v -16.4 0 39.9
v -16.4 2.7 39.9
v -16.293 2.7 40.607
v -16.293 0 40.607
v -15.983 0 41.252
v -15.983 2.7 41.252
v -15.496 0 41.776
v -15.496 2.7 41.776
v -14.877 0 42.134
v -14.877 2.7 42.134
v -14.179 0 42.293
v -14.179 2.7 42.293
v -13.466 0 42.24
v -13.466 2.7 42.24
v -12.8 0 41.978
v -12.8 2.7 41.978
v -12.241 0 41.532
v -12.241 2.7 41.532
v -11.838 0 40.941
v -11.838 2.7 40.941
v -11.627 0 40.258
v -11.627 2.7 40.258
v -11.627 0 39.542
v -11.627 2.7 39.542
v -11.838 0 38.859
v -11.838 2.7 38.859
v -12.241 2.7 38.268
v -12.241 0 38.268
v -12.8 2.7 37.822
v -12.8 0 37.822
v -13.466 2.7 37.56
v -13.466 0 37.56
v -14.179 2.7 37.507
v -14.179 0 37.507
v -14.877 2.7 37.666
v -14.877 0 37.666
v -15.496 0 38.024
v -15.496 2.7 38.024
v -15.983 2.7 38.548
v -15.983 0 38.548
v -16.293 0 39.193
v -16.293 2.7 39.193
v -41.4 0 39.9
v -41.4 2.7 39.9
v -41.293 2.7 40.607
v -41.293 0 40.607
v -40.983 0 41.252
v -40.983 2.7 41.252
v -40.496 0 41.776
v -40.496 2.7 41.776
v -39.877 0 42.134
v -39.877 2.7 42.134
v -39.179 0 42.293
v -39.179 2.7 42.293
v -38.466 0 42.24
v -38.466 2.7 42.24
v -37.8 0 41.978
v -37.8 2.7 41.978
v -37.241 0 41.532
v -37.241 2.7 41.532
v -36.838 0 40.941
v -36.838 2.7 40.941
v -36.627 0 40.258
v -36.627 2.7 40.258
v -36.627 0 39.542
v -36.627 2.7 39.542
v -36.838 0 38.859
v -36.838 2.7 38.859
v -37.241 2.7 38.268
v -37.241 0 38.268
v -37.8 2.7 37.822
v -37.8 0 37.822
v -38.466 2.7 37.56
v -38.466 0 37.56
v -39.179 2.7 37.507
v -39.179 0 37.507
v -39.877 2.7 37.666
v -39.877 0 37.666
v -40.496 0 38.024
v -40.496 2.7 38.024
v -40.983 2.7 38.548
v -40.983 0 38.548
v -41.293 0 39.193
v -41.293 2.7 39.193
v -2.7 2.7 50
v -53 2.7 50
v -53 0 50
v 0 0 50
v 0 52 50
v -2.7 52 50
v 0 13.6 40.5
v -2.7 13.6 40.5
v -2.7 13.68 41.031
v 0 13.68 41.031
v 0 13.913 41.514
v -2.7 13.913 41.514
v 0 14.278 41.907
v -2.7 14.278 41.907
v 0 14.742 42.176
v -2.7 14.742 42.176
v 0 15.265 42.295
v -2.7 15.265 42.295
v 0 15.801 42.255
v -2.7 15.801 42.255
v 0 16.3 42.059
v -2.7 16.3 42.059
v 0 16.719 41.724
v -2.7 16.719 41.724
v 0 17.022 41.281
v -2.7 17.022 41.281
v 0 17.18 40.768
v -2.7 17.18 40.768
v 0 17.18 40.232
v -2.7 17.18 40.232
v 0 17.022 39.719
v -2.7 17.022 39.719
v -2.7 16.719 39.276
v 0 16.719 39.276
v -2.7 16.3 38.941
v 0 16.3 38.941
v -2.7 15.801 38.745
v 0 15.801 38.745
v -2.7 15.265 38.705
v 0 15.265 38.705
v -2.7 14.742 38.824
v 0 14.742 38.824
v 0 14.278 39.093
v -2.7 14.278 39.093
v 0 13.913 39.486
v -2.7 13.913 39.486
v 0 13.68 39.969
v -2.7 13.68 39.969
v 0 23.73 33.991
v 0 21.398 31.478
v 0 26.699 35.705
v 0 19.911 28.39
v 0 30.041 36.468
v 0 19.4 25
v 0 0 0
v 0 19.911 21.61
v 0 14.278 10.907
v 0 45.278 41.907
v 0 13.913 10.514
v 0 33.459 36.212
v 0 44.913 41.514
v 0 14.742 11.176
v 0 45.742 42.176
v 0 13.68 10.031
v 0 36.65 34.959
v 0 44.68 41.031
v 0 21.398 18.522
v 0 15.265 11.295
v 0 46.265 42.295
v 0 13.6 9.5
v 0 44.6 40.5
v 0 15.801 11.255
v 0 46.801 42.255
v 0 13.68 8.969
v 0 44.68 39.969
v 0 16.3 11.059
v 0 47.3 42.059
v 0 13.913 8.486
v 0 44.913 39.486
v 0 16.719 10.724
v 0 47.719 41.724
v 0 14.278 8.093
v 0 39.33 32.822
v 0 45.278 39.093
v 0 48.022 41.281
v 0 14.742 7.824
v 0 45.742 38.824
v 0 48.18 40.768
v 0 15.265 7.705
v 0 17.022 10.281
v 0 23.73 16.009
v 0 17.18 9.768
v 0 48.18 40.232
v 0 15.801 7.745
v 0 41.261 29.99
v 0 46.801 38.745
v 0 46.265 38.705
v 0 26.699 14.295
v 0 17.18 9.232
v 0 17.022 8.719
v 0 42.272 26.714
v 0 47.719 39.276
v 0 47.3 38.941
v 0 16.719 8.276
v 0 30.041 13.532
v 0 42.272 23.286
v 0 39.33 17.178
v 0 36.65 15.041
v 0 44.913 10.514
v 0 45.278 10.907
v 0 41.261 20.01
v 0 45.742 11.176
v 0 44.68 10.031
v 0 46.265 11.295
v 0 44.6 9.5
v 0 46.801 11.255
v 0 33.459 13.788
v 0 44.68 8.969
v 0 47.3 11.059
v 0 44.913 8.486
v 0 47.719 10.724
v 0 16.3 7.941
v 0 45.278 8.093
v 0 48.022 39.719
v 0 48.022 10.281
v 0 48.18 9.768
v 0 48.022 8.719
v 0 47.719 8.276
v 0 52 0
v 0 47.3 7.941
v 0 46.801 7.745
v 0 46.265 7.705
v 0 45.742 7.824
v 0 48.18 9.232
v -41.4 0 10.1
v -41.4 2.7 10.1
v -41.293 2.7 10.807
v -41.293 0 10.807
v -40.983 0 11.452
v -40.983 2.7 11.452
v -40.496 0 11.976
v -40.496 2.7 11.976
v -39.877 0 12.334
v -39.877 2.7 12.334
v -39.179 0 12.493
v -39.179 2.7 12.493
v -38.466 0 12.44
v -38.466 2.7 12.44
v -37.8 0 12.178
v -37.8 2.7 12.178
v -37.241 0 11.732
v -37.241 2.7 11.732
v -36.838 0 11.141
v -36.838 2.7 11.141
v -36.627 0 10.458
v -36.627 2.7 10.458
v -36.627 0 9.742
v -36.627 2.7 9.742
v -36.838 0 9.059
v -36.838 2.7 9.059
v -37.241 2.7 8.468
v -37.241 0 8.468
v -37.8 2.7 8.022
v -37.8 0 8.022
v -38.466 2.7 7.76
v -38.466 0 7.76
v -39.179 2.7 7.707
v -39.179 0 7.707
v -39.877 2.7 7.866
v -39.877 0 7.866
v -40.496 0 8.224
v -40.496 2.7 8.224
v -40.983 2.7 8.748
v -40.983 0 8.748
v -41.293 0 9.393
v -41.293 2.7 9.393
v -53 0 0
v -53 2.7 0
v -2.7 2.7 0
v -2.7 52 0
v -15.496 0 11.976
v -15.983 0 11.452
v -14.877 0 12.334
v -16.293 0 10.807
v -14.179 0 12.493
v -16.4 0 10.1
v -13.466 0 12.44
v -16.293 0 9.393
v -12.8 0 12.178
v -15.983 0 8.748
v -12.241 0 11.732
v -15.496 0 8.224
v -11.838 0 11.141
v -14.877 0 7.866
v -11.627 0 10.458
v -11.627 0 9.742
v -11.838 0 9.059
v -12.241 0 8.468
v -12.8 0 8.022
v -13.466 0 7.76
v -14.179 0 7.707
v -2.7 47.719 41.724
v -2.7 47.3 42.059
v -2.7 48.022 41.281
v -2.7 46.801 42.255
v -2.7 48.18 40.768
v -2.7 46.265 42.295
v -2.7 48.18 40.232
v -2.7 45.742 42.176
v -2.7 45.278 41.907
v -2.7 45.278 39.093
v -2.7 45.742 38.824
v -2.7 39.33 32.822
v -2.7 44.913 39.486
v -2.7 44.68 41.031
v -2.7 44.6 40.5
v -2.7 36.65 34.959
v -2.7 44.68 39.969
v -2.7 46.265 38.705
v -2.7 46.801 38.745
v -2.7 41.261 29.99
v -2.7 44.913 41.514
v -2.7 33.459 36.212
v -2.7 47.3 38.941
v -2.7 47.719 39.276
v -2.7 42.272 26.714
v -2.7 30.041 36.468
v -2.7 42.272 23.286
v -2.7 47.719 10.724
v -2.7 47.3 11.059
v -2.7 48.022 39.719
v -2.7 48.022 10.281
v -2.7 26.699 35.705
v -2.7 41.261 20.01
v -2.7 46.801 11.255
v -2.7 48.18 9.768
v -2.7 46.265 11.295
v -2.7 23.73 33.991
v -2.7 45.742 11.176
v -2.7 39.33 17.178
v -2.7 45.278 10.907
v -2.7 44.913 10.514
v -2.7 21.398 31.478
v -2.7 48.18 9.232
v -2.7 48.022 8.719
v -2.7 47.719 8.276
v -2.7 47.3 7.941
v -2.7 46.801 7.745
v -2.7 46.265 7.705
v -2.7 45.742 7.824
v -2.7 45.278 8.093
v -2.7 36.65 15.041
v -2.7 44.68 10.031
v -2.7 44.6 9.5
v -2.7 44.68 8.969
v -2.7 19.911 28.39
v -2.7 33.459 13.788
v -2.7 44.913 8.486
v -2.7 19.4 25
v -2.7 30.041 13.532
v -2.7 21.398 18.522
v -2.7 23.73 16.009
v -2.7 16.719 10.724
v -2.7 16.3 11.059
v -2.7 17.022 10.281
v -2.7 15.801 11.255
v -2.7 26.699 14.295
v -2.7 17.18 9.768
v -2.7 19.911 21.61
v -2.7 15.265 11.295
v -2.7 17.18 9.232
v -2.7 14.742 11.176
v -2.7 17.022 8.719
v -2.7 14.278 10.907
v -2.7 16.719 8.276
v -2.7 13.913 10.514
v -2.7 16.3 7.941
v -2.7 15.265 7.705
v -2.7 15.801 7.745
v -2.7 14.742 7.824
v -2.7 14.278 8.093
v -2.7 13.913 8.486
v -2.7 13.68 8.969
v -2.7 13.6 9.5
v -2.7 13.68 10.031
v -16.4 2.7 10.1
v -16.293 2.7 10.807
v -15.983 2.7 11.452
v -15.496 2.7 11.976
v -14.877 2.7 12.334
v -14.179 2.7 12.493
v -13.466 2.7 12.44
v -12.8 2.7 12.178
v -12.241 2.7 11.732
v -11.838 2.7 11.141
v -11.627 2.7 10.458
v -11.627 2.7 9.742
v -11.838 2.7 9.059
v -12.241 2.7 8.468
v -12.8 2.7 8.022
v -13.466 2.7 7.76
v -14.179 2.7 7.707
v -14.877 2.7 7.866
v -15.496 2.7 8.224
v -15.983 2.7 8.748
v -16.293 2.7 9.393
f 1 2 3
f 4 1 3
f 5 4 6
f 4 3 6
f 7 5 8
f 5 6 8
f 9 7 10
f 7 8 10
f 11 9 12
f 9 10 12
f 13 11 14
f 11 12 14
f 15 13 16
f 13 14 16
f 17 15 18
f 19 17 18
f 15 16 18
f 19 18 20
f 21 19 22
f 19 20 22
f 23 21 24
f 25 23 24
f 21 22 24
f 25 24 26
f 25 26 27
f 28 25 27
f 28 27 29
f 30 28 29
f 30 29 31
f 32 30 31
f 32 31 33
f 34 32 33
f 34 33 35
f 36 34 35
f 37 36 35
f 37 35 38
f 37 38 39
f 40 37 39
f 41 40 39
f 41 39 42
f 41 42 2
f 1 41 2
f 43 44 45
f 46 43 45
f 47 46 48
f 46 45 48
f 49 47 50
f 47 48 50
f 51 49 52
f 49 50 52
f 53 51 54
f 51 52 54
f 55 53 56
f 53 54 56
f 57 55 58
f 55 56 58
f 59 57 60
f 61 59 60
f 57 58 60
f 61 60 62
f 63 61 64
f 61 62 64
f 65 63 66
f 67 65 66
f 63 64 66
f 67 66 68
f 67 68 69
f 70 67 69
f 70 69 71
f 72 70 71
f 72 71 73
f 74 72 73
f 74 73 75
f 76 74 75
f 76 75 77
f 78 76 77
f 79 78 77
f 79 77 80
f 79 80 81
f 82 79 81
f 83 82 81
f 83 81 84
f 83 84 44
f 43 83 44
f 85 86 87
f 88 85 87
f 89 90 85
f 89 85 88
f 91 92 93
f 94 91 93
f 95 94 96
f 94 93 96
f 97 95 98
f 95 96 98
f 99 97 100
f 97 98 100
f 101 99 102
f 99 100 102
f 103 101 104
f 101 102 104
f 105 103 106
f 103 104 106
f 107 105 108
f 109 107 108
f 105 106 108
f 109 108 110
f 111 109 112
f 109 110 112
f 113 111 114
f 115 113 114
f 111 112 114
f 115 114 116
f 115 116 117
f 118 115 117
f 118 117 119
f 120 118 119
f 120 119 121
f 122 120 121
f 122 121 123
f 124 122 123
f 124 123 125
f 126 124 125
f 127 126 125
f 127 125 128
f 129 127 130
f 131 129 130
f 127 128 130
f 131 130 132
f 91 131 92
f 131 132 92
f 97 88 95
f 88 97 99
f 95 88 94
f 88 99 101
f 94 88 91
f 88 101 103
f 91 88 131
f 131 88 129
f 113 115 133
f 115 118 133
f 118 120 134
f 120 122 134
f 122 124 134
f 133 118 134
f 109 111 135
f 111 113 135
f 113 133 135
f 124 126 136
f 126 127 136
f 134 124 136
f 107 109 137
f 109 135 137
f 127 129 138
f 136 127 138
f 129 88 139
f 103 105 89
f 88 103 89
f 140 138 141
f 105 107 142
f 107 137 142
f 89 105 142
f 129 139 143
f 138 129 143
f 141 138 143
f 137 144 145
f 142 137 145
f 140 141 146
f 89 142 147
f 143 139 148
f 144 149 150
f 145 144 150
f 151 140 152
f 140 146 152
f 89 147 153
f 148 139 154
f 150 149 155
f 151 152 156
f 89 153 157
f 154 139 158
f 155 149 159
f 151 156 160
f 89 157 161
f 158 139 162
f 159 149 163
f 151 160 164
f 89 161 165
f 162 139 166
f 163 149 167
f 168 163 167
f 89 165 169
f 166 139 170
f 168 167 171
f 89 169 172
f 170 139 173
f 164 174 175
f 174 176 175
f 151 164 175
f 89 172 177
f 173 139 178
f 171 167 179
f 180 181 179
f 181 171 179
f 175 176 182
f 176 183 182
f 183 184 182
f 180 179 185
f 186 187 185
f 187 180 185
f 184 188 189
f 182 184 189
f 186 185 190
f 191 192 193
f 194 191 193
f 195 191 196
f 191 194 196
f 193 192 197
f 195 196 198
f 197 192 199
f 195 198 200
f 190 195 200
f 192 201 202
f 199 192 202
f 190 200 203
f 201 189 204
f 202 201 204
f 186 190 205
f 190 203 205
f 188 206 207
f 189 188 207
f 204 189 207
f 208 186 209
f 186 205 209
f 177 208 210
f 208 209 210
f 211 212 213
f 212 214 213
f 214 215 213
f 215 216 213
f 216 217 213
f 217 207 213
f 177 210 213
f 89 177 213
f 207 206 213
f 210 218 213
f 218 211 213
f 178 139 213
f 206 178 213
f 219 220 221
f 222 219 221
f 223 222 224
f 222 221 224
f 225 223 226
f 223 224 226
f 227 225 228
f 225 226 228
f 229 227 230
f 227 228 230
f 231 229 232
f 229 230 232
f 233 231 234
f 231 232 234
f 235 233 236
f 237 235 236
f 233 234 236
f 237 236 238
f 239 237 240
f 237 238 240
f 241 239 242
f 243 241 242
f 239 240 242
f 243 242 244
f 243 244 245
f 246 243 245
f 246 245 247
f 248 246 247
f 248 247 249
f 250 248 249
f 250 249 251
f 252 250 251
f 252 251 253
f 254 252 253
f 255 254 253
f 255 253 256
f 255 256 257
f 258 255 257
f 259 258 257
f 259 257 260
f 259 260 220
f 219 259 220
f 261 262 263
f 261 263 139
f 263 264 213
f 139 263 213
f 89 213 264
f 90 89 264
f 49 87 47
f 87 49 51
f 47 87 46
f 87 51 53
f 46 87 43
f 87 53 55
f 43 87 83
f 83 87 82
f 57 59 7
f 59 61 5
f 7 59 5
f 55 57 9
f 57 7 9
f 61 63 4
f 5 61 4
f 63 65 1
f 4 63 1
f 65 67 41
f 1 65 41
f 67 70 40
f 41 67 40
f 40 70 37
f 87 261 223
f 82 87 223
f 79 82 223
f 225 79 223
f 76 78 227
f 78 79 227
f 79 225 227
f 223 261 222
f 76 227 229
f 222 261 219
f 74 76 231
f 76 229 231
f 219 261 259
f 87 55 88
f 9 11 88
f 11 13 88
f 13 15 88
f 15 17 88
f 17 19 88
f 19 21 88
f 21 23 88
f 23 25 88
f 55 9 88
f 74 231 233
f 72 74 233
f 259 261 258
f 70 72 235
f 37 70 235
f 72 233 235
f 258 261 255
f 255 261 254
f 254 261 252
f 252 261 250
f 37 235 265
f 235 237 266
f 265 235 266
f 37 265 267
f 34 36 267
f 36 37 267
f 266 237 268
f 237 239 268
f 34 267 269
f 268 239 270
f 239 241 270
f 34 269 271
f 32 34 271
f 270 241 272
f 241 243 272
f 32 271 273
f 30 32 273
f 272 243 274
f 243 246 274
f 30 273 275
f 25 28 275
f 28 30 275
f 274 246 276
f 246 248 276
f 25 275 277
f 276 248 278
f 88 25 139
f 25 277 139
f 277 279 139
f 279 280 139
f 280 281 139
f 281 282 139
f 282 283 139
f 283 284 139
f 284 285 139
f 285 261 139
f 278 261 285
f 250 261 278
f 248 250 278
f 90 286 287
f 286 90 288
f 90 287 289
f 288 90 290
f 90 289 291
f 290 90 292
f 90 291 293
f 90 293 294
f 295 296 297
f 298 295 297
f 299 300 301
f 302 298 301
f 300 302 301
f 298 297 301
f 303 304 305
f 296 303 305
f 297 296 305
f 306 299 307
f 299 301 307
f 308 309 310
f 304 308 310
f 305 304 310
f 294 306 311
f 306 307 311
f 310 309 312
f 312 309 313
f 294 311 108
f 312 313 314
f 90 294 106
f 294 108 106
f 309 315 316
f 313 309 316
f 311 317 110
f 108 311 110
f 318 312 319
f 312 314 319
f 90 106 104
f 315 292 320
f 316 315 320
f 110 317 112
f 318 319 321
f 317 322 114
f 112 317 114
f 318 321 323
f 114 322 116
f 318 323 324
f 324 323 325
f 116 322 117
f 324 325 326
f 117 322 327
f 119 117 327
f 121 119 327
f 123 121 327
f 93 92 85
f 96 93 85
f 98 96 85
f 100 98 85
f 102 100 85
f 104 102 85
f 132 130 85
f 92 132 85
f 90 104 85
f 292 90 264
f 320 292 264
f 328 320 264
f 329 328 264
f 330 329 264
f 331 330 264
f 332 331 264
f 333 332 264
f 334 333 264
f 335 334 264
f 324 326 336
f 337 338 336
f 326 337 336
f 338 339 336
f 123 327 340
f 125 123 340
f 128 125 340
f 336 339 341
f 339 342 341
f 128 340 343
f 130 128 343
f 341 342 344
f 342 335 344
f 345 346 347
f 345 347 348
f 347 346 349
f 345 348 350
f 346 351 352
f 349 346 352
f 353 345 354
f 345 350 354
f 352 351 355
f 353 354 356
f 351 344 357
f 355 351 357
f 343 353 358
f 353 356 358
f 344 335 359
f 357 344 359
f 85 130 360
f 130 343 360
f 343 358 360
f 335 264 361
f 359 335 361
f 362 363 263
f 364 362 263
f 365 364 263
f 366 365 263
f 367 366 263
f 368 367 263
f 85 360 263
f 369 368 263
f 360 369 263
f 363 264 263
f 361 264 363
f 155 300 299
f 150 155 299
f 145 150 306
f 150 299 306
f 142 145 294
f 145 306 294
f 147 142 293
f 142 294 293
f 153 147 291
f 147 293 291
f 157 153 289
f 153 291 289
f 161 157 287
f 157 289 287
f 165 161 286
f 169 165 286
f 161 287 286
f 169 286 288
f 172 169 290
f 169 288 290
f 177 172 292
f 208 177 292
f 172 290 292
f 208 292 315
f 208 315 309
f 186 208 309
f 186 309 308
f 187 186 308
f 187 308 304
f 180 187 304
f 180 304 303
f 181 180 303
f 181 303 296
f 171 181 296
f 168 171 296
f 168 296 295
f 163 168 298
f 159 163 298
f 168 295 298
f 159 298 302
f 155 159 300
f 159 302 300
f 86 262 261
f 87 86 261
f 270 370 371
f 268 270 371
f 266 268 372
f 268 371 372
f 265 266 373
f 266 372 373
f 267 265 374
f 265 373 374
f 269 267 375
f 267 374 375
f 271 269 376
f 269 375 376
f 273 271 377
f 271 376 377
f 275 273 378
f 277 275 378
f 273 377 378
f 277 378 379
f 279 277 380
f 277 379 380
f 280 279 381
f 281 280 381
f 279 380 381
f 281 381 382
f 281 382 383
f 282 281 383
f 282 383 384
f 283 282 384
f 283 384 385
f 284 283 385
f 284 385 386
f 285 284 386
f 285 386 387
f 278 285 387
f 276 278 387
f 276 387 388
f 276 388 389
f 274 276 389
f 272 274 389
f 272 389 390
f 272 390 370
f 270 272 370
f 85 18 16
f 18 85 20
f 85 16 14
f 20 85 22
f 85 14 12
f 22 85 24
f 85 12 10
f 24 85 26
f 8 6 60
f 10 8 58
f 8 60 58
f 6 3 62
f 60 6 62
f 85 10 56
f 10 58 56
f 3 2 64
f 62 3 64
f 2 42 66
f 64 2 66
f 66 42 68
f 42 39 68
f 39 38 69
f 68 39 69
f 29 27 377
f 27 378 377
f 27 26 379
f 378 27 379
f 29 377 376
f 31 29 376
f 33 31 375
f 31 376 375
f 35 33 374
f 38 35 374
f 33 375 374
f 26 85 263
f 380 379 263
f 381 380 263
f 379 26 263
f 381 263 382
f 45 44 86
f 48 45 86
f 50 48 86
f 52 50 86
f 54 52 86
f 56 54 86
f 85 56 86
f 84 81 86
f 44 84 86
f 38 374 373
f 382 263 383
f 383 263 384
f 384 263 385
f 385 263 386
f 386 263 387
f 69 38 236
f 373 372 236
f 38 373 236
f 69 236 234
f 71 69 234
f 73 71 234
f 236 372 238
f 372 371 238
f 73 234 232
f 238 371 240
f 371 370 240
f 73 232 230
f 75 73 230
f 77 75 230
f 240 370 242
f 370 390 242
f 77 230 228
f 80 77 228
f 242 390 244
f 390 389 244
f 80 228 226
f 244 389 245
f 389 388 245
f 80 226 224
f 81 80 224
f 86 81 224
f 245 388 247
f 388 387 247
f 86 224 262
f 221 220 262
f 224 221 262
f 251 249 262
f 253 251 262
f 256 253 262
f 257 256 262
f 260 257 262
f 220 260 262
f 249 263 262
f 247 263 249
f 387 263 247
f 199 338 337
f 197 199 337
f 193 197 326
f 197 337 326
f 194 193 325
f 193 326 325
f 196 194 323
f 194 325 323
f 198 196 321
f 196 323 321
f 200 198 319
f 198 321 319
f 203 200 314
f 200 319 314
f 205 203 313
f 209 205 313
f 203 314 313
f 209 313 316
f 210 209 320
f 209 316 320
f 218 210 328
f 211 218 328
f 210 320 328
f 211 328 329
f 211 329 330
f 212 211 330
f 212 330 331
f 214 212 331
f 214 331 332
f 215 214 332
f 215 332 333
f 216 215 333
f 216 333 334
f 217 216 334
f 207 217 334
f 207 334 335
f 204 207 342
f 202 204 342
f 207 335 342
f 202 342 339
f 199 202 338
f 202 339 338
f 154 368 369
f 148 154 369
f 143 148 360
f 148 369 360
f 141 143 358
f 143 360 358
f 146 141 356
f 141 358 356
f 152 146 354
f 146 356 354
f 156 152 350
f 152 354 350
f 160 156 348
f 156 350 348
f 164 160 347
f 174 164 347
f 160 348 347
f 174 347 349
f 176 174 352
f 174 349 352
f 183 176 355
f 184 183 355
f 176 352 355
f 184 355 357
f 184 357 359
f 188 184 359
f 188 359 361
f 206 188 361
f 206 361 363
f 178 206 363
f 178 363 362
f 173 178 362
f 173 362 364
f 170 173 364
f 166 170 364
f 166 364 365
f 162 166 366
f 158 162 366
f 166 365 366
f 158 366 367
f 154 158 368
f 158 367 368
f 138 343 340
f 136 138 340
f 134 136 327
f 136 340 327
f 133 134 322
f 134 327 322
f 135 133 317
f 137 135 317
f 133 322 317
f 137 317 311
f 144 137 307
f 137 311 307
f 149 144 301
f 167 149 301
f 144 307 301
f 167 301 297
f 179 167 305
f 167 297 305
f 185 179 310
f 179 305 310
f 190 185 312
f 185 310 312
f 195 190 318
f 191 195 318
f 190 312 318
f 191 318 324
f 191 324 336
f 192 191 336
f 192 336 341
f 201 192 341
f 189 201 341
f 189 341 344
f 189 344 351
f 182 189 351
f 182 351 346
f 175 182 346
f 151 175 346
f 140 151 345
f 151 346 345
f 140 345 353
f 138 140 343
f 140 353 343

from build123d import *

# Parameters (mm, degrees)
PAD_DEPTH       = 50
SKETCH001_R     = 11.5
SKETCH001_R_2   = 1.8
POCKET_DEPTH    = 2.7
SKETCH002_R     = 2.4
POCKET001_DEPTH = 5


with BuildPart() as part:
    # Sketch → Pad (new body)
    with BuildSketch(Plane.XY):
        Polygon((-2.7, 2.7), (-53, 2.7), (-53, 0), (0, 0), (0, 52), (-2.7, 52), align=None)
    extrude(amount=PAD_DEPTH)

    # Sketch001 → Pocket (cut)
    with BuildSketch(Plane(origin=(-2.7, 0, 0), x_dir=(0, -1, 0), z_dir=(-1, 0, 0))):
        with Locations((-30.9, 25)):
            Circle(SKETCH001_R)
        with Locations((-46.4, 40.5)):
            Circle(SKETCH001_R_2)
        with Locations((-15.4, 40.5)):
            Circle(SKETCH001_R_2)
        with Locations((-15.4, 9.5)):
            Circle(SKETCH001_R_2)
        with Locations((-46.4, 9.5)):
            Circle(SKETCH001_R_2)
    extrude(amount=-POCKET_DEPTH, mode=Mode.SUBTRACT)

    # Sketch002 → Pocket001 (cut)
    with BuildSketch(Plane(origin=(0, 2.7, 0), x_dir=(-1, 0, 0), z_dir=(0, 1, 0))):
        with Locations((14, 39.9)):
            Circle(SKETCH002_R)
        with Locations((39, 39.9)):
            Circle(SKETCH002_R)
        with Locations((39, 10.1)):
            Circle(SKETCH002_R)
        with Locations((14, 10.1)):
            Circle(SKETCH002_R)
    extrude(amount=-POCKET001_DEPTH, mode=Mode.SUBTRACT)


solid = part.part
